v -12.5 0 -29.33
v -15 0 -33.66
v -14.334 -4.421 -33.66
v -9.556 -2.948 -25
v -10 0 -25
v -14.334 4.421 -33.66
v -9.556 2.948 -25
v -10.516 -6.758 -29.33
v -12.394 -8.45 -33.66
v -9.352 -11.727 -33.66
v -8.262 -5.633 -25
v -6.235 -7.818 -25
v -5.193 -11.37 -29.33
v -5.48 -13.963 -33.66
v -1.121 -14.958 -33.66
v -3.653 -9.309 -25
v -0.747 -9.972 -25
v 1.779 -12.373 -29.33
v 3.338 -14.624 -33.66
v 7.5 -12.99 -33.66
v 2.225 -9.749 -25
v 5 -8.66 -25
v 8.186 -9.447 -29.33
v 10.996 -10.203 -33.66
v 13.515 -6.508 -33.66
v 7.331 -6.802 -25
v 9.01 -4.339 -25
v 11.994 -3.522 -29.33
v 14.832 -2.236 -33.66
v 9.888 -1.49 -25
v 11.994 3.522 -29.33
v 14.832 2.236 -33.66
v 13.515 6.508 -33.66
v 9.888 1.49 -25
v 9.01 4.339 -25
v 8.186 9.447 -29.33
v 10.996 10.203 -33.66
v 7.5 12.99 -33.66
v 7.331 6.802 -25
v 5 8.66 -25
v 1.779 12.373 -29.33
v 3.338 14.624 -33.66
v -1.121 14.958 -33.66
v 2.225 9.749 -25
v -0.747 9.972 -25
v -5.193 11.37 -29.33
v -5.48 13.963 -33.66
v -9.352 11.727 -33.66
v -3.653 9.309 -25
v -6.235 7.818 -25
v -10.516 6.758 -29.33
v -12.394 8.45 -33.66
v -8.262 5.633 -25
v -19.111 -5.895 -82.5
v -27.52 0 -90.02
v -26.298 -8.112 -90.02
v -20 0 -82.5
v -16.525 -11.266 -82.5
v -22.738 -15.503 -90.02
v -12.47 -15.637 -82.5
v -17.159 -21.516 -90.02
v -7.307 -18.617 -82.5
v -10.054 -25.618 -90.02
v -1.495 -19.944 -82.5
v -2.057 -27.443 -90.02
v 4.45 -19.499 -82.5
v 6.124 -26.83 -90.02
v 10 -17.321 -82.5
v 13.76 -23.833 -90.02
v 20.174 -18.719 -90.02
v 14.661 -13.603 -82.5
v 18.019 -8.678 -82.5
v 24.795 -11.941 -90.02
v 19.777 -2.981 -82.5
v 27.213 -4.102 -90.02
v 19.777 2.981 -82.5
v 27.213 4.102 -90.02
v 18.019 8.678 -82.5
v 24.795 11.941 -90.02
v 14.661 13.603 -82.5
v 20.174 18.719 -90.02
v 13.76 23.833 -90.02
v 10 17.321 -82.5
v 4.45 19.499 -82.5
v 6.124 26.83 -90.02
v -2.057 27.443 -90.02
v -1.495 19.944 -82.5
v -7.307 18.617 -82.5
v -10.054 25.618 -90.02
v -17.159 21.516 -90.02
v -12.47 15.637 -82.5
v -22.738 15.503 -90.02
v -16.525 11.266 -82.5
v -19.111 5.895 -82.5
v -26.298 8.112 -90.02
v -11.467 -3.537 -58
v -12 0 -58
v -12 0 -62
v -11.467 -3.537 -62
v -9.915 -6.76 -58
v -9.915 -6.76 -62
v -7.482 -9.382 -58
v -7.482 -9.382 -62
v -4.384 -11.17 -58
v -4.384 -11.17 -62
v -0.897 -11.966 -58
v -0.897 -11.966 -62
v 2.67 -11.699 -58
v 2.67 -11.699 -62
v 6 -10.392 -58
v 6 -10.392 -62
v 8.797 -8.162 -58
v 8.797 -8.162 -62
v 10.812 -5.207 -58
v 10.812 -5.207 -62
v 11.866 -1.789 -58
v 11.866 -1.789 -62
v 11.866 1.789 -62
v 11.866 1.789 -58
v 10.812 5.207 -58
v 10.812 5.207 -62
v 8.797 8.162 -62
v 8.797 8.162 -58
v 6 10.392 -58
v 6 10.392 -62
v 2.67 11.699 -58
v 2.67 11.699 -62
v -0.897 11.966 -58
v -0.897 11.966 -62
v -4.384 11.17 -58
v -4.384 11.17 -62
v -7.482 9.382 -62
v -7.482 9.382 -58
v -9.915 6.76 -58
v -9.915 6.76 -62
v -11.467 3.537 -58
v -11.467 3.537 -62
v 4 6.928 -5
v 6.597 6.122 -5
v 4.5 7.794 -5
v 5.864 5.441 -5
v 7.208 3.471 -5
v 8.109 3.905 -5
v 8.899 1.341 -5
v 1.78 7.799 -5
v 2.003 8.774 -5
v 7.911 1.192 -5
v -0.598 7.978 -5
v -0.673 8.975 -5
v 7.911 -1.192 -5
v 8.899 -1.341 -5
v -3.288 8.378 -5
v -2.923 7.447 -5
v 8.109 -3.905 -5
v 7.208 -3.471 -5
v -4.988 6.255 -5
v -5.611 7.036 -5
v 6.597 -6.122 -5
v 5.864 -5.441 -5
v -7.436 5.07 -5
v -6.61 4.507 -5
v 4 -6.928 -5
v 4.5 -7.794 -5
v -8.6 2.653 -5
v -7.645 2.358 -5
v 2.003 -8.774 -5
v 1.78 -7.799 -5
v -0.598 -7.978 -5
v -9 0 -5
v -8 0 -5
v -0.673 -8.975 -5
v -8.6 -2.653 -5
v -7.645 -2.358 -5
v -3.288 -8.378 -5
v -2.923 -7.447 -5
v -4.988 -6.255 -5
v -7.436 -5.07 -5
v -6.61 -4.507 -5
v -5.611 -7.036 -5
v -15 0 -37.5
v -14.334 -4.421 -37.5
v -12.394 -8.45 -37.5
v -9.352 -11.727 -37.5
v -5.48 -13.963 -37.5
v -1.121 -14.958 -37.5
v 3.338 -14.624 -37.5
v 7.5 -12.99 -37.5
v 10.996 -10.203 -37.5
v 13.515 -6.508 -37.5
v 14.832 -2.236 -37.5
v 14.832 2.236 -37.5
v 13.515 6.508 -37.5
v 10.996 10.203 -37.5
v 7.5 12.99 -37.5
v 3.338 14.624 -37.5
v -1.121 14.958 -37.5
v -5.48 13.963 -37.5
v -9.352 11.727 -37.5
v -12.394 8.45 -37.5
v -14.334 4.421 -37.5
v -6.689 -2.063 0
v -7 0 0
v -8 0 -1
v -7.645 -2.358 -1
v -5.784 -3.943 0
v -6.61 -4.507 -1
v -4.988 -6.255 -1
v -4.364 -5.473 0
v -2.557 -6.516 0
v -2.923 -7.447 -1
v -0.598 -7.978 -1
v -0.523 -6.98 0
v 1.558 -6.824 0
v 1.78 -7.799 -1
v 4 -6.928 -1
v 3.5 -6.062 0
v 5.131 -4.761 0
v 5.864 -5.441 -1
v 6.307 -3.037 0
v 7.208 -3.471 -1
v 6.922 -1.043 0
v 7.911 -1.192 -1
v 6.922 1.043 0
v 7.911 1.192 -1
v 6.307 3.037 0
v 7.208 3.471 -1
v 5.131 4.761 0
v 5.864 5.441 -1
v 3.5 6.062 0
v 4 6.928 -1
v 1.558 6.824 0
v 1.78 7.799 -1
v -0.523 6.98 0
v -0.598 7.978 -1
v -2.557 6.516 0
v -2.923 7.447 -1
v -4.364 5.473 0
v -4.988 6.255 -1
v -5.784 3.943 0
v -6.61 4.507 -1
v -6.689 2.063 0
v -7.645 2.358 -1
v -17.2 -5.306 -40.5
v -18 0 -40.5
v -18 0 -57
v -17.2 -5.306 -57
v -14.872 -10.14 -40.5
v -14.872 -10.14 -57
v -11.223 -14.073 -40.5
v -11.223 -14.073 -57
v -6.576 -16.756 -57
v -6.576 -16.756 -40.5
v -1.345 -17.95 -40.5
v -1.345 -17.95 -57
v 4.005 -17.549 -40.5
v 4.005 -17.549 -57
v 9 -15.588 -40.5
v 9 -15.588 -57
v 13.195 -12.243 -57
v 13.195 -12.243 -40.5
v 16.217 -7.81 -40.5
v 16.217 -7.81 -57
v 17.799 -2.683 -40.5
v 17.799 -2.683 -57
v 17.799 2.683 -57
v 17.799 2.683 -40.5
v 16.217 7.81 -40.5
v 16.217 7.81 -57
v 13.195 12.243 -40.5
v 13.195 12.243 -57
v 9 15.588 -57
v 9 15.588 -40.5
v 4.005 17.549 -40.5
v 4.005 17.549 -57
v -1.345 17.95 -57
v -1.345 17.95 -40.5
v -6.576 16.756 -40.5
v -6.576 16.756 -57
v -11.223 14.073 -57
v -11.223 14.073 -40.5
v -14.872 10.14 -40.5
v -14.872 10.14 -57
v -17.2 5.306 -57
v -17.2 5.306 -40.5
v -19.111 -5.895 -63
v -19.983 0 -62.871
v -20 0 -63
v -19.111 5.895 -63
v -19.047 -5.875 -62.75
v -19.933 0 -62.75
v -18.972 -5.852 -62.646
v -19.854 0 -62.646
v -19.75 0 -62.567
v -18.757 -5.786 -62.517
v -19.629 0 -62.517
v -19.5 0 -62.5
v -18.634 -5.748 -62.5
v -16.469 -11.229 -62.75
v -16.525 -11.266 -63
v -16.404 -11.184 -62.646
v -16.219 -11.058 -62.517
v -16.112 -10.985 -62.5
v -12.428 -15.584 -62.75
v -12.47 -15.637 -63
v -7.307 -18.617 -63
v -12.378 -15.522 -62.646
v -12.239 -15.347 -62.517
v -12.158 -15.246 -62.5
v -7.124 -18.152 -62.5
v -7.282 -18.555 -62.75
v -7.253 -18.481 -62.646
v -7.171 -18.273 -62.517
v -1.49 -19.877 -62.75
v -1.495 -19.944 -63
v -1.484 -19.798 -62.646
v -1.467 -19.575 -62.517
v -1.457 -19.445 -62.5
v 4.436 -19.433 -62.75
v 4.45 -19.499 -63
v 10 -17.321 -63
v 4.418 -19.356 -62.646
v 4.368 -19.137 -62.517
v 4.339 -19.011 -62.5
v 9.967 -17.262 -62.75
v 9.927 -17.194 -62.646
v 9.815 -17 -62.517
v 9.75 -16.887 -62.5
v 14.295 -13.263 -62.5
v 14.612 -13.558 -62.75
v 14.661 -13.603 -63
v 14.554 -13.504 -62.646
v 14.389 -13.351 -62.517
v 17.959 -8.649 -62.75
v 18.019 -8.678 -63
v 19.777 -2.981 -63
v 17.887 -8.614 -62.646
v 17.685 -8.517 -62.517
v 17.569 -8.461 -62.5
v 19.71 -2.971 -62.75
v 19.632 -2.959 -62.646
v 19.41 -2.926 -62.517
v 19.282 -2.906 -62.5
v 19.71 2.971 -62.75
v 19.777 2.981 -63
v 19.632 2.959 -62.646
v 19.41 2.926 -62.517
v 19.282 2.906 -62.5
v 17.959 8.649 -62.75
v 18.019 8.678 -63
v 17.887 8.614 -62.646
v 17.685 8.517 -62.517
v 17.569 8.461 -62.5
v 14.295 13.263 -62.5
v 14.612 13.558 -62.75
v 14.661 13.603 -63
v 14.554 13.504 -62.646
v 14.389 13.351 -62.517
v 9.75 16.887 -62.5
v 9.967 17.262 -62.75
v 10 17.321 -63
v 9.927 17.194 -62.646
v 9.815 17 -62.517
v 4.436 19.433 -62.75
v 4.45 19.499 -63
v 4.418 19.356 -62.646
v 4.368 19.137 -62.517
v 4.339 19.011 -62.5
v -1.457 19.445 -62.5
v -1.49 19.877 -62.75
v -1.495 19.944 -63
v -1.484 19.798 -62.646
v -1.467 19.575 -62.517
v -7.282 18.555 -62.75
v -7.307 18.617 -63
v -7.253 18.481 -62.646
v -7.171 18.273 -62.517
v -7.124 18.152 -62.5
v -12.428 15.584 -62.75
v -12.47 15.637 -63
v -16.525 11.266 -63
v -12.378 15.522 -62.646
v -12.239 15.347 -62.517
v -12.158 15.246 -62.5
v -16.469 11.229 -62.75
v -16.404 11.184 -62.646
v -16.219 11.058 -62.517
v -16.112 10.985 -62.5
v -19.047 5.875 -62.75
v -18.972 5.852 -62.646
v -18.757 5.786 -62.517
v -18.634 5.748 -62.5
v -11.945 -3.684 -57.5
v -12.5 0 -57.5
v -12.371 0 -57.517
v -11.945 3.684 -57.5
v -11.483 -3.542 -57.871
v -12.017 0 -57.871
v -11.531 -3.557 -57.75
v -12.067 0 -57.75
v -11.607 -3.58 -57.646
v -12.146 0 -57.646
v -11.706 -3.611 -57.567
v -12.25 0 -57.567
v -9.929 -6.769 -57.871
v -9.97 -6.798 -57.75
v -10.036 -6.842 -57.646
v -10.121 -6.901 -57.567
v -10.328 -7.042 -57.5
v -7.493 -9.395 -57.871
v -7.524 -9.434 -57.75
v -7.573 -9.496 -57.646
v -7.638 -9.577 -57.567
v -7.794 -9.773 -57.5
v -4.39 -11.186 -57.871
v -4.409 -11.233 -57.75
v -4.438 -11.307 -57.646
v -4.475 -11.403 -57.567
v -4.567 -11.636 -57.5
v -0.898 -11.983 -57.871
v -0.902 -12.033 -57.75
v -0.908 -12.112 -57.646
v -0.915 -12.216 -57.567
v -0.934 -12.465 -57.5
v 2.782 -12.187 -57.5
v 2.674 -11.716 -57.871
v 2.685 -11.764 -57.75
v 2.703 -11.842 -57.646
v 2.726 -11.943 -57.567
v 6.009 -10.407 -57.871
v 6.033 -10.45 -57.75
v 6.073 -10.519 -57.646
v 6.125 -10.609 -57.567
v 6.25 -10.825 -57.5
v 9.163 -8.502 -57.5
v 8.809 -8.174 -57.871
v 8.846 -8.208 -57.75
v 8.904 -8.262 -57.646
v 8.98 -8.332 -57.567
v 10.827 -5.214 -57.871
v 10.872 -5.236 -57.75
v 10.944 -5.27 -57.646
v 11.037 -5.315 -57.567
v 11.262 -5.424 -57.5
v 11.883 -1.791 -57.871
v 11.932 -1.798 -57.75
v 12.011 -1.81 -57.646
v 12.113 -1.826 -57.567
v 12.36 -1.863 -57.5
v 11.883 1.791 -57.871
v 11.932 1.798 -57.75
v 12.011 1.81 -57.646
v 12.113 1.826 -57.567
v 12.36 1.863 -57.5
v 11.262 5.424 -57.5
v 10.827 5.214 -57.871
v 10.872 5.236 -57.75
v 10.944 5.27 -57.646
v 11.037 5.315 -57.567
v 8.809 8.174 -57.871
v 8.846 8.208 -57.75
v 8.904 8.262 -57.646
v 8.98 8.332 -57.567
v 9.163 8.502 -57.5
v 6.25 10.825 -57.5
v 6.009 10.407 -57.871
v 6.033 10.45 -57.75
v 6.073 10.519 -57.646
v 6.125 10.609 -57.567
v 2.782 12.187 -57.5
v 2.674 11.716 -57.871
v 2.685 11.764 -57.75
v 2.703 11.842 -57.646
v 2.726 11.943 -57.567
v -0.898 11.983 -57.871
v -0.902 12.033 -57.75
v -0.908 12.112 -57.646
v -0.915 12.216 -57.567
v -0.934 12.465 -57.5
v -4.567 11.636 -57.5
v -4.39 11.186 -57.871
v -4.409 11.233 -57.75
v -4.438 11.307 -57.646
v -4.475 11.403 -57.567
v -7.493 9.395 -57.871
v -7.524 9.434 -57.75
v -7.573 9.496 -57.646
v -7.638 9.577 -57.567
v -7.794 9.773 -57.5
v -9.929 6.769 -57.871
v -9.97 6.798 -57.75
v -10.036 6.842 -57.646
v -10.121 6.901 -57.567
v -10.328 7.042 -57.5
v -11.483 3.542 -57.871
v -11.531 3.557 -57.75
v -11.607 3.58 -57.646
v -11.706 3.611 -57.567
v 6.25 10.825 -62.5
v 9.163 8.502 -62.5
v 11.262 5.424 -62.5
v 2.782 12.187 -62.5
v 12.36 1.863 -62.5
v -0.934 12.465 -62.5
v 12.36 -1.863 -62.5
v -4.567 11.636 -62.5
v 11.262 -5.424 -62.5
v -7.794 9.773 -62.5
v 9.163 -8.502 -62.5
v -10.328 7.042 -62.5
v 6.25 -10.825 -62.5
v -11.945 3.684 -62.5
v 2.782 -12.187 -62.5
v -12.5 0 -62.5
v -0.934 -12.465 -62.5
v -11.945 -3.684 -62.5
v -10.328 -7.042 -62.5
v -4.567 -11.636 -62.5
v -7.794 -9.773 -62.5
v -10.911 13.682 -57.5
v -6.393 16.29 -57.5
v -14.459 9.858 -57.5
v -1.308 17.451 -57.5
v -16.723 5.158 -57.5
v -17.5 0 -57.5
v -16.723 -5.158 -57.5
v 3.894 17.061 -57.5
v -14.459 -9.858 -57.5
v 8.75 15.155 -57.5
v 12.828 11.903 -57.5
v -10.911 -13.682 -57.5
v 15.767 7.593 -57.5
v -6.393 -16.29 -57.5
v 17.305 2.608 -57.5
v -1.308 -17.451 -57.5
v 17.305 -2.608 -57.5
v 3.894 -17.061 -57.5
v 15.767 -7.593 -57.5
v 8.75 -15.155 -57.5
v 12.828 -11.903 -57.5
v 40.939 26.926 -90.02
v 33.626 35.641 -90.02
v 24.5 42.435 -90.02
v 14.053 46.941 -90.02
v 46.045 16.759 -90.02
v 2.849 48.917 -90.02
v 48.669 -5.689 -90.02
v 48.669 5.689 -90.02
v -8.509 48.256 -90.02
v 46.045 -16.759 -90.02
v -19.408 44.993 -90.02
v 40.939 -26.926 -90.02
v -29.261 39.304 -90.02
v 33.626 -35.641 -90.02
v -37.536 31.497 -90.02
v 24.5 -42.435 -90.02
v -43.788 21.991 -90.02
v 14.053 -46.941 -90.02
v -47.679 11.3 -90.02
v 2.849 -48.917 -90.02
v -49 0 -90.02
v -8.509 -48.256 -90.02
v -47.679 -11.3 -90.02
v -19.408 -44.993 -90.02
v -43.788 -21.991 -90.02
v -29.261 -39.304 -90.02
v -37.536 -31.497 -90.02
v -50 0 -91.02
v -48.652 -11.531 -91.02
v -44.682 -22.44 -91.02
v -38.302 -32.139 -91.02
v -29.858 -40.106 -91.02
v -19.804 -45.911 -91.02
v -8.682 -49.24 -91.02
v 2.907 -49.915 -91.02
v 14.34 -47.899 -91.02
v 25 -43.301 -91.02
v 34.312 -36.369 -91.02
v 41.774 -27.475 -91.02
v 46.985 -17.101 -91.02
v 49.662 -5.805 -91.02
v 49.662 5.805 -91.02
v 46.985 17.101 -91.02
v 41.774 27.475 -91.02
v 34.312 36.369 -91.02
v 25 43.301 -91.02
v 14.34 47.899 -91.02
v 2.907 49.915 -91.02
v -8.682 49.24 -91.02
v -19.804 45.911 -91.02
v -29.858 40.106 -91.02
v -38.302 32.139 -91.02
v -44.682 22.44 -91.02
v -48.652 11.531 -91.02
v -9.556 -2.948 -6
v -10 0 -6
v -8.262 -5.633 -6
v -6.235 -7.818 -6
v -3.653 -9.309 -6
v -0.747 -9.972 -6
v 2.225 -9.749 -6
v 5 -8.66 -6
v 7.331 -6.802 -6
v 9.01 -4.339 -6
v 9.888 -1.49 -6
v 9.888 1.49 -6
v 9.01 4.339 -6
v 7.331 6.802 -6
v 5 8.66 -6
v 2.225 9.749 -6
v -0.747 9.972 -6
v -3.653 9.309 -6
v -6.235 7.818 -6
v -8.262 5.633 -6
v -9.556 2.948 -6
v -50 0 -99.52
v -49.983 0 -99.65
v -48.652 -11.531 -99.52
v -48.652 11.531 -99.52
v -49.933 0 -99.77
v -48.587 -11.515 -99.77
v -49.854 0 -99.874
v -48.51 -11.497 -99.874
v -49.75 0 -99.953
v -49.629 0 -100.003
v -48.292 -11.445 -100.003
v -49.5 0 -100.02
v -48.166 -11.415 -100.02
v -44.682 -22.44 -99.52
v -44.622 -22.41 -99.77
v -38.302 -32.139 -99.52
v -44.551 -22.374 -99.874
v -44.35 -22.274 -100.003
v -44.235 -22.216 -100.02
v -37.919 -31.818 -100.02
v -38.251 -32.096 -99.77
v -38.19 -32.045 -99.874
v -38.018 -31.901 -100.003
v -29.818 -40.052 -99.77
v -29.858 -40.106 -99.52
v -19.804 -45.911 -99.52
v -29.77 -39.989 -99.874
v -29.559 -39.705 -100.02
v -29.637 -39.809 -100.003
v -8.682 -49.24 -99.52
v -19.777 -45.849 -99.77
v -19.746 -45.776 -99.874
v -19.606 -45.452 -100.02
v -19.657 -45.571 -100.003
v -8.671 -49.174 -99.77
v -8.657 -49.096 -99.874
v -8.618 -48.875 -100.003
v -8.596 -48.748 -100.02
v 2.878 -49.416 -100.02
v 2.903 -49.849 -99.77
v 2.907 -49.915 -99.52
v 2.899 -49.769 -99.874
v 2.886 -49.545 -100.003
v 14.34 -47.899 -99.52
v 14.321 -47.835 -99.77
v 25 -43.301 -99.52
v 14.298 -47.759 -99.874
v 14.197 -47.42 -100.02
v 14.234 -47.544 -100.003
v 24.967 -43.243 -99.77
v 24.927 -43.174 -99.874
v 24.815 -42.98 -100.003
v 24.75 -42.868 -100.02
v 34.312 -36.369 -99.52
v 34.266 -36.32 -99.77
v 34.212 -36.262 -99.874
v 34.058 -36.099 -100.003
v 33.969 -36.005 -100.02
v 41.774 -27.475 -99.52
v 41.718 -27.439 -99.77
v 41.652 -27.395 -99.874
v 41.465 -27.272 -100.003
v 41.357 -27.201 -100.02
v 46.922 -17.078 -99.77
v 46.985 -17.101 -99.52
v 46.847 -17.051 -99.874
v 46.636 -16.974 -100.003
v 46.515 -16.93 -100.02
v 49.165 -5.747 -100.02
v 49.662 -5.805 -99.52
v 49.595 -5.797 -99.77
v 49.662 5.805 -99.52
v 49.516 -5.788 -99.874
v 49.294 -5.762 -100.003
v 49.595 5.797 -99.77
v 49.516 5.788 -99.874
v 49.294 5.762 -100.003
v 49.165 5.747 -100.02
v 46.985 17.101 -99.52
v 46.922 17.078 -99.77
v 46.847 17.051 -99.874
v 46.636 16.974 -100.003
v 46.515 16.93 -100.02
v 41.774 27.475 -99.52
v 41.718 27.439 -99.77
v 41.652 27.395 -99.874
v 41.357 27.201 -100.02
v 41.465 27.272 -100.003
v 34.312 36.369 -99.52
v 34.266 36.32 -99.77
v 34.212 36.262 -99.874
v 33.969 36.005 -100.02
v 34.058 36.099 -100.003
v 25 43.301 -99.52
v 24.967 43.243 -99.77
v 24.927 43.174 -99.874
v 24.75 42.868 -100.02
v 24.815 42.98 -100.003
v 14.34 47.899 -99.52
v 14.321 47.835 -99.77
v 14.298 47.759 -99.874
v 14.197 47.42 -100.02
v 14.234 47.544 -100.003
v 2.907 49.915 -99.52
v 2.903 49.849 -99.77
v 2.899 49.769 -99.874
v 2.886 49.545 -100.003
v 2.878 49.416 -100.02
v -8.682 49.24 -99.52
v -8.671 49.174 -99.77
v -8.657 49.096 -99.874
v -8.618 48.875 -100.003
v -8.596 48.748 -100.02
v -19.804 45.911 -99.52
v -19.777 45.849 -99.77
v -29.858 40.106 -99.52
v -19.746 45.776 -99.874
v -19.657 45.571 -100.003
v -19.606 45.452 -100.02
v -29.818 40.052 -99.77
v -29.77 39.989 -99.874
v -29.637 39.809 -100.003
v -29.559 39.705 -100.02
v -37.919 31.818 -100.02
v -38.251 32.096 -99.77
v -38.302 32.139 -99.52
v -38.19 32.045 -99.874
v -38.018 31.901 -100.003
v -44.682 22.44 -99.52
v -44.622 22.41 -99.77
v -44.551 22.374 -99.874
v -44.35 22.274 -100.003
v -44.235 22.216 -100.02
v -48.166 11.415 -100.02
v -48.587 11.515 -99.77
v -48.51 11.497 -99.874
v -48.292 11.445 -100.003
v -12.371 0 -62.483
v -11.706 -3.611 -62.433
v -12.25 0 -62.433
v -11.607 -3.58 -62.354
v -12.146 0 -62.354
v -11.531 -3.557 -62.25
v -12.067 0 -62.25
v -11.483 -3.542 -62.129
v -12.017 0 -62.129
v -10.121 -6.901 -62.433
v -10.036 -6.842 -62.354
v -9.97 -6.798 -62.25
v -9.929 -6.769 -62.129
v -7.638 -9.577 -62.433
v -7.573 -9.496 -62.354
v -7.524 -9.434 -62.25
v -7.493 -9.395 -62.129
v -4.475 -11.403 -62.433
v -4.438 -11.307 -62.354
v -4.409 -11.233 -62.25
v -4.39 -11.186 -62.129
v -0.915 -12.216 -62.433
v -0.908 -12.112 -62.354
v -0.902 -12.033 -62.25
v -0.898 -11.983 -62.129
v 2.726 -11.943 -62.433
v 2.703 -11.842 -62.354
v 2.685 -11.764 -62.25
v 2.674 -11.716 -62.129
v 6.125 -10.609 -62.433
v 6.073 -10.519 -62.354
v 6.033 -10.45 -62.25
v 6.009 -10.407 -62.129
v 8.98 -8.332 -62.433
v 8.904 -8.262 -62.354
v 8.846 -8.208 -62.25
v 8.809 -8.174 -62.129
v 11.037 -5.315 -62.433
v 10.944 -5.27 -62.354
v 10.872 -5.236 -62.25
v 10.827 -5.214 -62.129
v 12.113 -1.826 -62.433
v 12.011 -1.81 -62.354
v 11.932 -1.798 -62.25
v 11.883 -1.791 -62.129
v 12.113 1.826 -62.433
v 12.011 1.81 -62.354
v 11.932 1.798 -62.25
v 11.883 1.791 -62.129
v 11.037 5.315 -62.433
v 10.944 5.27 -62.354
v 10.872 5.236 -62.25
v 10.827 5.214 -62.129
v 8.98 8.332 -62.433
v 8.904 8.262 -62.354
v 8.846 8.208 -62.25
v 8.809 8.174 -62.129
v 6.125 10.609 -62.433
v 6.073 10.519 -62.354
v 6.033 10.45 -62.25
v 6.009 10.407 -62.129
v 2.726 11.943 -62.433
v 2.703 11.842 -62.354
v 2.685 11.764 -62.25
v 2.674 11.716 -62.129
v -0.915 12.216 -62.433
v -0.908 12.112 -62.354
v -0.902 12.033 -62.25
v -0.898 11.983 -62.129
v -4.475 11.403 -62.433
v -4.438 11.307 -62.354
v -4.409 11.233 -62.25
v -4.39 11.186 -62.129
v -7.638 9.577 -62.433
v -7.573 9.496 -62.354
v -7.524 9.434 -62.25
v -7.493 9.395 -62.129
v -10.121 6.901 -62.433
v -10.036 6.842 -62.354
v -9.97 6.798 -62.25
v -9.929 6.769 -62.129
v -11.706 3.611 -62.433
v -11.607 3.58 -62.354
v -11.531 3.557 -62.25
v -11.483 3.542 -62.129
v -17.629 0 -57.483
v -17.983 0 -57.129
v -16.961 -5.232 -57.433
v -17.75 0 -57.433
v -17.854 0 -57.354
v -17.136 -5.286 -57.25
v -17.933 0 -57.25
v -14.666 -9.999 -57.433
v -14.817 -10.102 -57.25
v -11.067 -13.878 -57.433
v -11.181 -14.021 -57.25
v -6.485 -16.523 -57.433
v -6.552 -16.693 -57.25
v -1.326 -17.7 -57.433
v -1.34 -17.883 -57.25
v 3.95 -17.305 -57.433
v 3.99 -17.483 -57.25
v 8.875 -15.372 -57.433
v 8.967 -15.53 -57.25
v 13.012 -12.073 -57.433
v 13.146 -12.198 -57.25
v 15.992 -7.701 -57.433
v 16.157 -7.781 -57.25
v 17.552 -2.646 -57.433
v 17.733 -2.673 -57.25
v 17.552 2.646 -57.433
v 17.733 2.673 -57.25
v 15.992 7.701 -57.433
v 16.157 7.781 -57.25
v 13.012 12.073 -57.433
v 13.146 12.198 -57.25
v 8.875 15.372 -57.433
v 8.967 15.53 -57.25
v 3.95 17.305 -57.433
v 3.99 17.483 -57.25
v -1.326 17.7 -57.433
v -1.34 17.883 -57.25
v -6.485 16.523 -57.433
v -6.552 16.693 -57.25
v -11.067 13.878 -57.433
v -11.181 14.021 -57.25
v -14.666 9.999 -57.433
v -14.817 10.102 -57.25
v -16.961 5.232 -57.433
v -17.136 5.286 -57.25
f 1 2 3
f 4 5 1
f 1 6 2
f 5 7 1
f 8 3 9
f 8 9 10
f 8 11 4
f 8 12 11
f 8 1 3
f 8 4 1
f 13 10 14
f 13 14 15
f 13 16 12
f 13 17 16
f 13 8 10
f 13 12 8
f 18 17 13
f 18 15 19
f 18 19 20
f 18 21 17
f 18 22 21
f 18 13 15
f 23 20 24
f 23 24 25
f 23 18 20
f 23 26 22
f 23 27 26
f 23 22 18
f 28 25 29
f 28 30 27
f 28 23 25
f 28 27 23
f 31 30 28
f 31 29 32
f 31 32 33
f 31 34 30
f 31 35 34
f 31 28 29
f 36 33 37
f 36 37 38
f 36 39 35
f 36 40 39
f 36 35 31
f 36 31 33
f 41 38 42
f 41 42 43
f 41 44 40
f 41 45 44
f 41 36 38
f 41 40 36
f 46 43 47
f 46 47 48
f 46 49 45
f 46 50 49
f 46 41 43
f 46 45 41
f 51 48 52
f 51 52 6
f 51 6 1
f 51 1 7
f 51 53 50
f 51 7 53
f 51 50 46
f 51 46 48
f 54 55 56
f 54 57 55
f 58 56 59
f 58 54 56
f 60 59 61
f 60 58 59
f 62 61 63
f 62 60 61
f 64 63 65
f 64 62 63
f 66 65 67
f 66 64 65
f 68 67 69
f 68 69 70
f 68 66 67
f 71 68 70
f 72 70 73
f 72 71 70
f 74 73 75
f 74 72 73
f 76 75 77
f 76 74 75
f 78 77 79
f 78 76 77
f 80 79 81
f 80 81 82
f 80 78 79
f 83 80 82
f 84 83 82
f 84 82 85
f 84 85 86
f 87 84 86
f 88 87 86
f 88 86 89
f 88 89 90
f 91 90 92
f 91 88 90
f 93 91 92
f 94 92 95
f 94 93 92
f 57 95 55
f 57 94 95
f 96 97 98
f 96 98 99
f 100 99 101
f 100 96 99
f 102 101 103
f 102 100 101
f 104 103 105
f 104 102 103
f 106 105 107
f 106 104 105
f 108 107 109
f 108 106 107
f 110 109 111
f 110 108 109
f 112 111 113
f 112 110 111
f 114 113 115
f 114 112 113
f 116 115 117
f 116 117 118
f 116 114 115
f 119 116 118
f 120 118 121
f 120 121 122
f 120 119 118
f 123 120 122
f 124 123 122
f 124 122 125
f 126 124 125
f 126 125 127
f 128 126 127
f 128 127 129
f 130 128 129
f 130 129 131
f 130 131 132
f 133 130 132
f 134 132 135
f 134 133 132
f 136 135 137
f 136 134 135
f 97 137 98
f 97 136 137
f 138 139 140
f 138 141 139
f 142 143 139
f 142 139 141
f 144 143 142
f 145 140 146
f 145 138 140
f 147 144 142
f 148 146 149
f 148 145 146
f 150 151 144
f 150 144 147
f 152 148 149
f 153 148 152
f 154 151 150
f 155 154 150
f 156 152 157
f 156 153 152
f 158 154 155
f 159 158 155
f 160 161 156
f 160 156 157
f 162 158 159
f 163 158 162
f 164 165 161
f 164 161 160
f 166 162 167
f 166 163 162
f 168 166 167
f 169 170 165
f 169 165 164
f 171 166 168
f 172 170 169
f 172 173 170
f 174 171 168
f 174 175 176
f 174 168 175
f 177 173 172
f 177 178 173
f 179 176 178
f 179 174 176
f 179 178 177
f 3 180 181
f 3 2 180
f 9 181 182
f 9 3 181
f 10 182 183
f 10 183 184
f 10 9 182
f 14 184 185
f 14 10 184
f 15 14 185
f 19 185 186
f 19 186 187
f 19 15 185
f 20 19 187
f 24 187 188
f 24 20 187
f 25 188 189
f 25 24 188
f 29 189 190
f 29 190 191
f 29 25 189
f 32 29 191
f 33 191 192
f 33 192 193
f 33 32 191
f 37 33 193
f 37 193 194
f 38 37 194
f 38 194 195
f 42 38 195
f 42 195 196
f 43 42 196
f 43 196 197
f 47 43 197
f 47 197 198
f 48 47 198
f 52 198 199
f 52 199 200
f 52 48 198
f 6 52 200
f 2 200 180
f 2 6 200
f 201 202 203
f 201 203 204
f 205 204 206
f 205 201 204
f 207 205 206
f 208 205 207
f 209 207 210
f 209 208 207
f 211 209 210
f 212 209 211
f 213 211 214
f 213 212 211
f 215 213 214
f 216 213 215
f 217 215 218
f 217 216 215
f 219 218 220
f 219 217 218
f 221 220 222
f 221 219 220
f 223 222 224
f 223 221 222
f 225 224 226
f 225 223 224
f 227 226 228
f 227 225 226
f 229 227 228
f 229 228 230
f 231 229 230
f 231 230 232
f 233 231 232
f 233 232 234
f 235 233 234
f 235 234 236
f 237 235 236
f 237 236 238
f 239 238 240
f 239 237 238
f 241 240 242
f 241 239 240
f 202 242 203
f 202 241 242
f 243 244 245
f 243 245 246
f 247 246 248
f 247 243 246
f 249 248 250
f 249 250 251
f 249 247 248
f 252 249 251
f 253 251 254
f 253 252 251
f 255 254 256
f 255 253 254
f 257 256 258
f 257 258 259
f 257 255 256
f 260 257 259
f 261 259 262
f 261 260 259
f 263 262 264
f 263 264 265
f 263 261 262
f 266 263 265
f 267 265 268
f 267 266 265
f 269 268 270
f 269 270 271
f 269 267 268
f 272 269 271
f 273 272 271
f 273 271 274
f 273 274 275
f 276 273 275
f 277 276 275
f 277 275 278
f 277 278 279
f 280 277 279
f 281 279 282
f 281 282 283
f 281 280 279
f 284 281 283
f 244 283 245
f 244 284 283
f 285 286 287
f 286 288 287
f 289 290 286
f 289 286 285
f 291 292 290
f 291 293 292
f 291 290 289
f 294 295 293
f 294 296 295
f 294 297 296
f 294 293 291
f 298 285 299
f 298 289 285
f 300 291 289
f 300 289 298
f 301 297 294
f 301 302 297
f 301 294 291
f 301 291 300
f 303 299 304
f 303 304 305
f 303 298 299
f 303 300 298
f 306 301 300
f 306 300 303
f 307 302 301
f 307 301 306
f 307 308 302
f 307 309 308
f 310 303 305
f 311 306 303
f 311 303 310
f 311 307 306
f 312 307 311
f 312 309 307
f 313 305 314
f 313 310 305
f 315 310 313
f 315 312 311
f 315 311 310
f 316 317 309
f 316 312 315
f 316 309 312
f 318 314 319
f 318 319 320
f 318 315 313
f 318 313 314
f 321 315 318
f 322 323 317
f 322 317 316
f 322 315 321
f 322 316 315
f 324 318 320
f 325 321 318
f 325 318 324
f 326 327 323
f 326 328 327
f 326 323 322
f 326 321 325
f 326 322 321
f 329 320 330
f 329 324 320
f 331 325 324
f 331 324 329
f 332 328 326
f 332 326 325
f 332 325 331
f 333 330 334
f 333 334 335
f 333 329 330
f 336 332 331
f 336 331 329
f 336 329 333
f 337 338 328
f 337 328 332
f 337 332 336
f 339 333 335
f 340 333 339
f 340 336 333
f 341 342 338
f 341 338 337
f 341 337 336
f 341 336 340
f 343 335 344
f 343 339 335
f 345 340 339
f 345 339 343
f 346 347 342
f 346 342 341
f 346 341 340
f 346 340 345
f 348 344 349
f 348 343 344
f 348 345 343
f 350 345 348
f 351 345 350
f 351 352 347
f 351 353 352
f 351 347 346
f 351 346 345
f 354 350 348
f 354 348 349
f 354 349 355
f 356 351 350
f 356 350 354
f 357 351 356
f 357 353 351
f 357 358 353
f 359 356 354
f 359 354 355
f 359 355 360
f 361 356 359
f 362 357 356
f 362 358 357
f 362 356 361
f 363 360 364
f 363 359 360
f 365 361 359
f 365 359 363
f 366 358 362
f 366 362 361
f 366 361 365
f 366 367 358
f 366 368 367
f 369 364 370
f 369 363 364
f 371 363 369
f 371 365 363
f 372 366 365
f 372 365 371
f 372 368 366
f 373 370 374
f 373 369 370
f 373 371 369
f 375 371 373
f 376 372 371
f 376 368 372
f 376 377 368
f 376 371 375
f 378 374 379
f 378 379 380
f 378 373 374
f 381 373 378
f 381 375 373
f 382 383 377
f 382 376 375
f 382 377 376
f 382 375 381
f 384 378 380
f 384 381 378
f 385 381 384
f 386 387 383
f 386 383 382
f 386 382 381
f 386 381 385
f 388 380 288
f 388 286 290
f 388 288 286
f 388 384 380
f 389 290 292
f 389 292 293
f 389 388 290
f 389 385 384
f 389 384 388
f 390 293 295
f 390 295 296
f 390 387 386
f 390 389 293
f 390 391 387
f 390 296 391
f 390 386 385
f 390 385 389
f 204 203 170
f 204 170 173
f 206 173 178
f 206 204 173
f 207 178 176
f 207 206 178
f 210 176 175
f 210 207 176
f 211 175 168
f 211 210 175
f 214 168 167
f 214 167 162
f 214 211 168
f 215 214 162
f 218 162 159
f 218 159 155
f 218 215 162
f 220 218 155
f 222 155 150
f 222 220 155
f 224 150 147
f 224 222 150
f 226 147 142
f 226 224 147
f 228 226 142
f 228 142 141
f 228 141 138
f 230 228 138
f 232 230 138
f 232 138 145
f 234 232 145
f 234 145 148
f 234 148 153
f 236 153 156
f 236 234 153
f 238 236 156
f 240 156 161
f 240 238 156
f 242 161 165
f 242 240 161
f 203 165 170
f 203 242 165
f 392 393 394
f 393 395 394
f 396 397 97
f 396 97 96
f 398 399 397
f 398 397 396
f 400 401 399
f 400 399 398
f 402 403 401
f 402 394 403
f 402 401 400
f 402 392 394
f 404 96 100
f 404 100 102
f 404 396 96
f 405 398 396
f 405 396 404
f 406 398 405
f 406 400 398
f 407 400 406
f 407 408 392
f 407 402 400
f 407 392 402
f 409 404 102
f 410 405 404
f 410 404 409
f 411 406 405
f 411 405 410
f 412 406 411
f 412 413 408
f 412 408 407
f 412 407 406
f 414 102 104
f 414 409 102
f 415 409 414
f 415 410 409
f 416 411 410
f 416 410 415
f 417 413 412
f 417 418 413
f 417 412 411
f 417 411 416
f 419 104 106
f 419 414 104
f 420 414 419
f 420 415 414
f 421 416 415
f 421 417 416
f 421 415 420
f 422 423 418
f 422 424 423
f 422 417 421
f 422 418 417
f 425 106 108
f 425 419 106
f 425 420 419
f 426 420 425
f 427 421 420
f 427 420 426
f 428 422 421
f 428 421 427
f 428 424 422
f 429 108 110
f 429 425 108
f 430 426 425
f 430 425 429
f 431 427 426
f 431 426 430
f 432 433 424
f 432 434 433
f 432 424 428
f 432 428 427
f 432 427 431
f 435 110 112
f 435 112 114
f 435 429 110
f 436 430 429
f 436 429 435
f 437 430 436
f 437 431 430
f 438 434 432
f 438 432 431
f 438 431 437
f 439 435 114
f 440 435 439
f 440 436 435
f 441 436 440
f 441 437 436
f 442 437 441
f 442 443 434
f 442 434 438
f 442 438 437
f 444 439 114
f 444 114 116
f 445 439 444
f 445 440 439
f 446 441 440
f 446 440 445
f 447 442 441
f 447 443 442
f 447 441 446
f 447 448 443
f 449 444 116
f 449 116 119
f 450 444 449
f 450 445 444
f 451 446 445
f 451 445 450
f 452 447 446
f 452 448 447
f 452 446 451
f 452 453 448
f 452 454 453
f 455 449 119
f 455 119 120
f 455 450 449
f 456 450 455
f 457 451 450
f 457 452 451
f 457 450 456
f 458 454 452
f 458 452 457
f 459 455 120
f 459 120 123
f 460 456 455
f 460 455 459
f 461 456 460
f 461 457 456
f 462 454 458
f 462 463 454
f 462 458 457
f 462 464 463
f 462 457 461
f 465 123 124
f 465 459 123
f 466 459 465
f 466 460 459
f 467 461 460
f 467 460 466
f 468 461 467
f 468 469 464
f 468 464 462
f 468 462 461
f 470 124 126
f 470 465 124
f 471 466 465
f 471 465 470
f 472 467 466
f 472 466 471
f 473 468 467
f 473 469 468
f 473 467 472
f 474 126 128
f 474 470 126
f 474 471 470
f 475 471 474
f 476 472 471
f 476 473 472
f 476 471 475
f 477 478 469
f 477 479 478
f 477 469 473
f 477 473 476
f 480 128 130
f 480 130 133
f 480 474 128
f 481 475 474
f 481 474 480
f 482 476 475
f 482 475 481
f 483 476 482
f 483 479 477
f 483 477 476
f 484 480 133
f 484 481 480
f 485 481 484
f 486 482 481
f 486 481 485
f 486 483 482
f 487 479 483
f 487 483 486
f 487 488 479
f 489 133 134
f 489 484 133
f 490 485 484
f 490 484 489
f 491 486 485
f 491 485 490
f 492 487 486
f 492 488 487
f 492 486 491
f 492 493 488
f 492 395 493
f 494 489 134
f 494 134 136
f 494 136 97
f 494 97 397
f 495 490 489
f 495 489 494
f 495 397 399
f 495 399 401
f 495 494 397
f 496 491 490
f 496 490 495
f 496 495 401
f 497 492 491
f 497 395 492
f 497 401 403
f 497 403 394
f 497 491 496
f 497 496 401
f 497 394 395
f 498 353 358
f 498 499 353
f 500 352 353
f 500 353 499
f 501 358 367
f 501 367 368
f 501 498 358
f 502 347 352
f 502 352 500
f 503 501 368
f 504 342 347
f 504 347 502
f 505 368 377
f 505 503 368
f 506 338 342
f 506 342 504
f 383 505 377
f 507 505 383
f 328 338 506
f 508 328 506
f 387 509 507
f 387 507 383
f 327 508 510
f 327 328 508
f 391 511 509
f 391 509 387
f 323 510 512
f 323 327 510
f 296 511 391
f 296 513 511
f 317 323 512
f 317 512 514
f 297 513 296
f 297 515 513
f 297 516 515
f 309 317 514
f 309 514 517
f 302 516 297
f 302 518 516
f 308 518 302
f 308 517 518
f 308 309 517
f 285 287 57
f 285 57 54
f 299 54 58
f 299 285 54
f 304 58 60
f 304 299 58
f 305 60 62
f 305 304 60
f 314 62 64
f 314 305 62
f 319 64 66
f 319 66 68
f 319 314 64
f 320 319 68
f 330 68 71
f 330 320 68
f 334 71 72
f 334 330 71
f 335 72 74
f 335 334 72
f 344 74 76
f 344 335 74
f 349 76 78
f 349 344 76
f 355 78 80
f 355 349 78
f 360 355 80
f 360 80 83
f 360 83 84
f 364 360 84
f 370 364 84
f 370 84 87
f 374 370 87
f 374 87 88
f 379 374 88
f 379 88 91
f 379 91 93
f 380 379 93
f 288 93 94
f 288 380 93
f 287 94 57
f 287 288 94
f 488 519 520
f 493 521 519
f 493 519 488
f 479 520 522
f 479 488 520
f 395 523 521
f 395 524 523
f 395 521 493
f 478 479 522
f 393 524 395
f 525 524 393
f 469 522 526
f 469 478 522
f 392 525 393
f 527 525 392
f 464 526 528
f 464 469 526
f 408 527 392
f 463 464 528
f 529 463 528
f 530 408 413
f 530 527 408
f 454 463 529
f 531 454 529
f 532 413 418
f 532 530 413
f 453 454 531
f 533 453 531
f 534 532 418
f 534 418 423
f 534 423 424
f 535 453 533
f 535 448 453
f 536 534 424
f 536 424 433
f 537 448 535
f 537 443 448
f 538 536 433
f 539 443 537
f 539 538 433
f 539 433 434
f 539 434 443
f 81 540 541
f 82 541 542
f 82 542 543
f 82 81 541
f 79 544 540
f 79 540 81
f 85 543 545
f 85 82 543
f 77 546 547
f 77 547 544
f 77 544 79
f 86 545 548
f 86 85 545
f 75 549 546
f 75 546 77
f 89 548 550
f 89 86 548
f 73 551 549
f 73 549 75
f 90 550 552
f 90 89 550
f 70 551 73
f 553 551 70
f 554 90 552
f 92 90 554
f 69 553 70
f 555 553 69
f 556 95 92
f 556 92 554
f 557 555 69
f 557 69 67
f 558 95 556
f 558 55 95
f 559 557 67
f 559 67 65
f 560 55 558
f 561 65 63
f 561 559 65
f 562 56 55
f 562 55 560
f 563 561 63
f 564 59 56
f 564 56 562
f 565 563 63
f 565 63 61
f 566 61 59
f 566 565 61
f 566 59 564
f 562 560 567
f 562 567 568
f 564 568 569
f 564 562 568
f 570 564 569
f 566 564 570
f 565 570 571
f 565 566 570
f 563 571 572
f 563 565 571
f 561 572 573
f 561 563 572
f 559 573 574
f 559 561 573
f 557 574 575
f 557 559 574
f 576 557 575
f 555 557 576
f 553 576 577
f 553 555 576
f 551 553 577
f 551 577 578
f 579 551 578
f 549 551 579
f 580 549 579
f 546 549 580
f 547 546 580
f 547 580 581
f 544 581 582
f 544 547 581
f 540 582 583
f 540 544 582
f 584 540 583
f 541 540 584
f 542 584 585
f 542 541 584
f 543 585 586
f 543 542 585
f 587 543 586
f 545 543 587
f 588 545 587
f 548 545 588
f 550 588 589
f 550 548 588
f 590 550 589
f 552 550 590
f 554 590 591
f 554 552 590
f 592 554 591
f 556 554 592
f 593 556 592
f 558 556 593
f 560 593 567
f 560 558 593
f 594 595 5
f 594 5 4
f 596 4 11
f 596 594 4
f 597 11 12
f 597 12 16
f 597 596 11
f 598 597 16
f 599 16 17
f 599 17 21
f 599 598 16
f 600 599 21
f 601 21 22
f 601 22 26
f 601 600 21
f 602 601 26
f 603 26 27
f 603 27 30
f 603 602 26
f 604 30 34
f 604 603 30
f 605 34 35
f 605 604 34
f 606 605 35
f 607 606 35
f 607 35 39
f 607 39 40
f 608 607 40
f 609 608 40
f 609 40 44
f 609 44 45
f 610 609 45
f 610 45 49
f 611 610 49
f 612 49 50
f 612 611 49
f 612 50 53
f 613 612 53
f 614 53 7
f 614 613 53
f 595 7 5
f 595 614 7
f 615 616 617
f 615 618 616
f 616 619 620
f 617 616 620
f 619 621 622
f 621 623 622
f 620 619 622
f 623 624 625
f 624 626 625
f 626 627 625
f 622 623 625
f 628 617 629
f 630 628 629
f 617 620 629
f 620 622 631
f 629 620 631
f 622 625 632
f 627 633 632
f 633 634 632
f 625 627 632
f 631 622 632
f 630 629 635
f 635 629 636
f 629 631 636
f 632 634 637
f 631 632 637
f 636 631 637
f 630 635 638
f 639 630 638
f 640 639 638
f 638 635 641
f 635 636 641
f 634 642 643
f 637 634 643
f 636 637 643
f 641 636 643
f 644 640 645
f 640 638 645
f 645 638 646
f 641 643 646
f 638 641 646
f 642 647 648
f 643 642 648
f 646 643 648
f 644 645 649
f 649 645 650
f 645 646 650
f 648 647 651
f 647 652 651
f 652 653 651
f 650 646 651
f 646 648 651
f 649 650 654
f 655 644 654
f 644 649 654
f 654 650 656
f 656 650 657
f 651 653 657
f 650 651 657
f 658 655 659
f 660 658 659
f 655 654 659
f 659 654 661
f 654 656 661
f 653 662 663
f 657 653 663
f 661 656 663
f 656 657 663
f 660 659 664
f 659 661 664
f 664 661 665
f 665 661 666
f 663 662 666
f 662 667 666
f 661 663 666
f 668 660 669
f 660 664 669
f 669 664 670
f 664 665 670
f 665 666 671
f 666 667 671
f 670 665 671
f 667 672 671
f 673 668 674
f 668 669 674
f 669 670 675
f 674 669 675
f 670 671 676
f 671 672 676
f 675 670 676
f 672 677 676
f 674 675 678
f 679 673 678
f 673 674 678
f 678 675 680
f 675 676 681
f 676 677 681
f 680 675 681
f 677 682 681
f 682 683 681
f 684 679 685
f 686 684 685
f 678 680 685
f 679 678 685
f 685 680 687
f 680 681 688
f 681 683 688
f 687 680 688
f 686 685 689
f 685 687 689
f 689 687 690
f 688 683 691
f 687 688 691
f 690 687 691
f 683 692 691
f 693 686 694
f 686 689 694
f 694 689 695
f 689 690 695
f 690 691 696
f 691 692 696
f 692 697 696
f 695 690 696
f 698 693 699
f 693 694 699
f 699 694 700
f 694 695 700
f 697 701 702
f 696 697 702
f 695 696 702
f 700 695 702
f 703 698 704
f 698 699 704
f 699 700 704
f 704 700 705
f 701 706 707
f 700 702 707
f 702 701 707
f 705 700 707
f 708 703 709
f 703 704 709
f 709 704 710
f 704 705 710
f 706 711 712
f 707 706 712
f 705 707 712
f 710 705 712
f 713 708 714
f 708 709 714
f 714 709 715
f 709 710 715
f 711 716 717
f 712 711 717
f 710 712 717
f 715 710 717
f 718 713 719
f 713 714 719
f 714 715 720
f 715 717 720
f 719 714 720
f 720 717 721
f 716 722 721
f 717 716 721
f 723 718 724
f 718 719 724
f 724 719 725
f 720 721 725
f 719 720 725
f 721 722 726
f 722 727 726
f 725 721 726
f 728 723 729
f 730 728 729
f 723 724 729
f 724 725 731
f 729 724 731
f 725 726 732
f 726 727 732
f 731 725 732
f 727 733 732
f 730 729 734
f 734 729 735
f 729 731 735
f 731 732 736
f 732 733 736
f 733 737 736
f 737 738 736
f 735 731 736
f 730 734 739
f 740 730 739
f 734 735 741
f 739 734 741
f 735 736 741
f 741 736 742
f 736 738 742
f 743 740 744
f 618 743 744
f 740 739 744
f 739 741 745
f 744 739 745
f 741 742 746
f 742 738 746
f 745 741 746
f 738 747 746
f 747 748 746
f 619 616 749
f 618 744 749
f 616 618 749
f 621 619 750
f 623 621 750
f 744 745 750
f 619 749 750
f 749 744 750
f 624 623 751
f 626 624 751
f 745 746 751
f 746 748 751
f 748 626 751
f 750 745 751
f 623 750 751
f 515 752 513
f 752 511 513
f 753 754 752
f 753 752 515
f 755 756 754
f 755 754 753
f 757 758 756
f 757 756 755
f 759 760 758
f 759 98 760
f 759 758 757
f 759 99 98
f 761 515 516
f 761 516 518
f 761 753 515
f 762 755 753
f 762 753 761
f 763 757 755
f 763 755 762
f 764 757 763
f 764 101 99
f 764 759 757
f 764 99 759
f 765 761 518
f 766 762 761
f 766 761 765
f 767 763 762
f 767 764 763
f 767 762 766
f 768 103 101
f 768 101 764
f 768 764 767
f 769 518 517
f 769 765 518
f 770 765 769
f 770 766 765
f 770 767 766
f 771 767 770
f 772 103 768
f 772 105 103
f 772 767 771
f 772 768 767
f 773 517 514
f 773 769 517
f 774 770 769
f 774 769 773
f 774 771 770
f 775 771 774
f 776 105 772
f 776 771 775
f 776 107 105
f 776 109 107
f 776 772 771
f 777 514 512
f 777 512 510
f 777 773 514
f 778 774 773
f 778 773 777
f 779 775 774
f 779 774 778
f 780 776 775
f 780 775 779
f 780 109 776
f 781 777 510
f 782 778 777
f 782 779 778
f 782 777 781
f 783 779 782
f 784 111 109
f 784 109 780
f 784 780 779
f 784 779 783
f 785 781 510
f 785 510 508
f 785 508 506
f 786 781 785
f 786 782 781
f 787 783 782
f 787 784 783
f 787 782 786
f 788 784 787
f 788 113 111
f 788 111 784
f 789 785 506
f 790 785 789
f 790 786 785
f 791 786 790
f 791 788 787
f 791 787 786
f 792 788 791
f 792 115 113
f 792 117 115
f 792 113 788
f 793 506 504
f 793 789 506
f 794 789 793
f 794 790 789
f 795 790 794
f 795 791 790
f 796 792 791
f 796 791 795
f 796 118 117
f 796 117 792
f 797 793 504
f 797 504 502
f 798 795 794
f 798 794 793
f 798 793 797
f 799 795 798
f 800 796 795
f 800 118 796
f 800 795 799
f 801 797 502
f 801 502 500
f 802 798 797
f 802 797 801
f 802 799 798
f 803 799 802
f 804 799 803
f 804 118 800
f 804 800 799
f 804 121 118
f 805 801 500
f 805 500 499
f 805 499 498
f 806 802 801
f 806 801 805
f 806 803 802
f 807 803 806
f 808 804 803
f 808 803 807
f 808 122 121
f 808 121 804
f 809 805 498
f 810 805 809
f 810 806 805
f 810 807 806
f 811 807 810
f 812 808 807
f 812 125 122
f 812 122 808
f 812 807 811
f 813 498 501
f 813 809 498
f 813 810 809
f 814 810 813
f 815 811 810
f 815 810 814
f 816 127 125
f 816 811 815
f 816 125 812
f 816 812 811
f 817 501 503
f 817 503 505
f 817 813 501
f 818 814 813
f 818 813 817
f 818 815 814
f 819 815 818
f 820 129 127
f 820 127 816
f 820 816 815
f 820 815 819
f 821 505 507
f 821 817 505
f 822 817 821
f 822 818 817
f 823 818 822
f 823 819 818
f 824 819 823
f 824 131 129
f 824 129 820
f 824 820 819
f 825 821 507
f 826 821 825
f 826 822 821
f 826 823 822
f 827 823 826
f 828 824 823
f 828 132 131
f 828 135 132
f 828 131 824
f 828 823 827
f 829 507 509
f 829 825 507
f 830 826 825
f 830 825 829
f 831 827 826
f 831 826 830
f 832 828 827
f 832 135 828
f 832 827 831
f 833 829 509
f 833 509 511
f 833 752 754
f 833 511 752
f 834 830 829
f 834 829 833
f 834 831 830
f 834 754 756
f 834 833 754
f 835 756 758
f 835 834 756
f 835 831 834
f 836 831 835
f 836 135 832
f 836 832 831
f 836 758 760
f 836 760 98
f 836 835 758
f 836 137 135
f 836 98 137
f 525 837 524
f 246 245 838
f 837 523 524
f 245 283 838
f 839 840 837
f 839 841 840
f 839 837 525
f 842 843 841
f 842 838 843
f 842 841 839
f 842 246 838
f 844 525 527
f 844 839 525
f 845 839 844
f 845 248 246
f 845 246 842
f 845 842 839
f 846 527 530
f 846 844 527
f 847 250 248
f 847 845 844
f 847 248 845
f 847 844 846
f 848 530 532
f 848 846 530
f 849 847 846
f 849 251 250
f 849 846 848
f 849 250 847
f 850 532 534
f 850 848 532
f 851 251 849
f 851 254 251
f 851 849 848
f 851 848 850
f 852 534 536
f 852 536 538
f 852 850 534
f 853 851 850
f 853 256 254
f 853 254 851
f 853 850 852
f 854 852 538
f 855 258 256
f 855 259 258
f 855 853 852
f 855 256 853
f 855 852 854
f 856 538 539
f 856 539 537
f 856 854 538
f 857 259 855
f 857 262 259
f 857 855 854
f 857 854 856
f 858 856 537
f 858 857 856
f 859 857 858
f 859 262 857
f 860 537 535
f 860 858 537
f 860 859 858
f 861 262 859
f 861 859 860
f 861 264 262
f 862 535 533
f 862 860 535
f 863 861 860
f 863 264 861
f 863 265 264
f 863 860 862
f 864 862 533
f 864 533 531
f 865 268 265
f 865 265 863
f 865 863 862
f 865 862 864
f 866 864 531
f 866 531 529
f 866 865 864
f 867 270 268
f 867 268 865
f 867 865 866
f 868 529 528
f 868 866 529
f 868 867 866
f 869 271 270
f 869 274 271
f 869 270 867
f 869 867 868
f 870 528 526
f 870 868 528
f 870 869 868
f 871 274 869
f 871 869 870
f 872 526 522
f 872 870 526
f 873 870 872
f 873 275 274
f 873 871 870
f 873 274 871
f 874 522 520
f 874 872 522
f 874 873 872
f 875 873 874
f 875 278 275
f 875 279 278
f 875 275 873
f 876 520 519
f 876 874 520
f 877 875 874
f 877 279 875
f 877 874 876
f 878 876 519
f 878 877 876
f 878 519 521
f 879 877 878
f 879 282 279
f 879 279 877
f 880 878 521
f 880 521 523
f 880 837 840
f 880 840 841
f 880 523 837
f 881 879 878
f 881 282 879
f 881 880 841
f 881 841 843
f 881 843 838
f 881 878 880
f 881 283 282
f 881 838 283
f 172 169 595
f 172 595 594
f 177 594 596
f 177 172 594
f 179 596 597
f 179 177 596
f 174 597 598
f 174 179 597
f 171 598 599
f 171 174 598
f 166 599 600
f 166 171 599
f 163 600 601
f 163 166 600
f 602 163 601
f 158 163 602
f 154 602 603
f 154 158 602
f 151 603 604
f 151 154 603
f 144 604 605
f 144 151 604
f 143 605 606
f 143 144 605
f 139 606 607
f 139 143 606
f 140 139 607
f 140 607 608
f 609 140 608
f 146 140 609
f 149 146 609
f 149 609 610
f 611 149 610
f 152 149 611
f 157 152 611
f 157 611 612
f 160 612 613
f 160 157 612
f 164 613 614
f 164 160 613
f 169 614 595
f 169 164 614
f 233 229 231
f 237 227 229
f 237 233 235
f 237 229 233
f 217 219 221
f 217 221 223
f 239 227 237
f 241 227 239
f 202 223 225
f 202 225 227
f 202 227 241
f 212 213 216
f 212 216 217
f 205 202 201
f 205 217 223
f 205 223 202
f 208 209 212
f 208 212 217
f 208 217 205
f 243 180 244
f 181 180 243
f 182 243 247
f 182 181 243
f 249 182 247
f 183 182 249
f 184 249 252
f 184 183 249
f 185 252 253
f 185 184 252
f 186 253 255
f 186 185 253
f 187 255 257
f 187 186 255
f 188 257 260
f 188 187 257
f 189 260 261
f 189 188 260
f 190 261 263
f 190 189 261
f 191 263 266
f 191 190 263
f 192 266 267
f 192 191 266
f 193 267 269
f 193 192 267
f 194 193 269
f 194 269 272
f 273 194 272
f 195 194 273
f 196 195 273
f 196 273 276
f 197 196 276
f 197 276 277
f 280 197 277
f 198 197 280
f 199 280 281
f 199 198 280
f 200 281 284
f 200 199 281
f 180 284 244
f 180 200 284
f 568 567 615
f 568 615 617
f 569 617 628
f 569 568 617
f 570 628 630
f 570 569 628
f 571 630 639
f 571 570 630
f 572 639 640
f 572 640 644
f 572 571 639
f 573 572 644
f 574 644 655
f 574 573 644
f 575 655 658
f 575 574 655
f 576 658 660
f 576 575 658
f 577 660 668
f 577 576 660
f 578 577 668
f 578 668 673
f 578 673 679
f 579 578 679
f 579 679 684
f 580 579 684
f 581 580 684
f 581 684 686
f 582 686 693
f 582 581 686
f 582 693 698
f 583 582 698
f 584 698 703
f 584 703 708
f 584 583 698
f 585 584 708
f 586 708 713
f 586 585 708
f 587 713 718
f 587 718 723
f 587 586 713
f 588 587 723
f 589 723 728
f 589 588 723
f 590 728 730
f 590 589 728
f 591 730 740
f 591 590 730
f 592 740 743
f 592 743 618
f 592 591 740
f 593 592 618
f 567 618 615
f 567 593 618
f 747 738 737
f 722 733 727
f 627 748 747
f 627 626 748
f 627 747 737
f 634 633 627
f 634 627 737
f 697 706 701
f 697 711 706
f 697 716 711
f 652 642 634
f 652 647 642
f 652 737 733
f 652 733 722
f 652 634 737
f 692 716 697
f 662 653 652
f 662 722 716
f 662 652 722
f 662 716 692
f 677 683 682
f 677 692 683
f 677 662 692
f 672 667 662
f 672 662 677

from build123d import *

# Parameters (mm, degrees)
CHAMFER1_SIZE = 1
FILLET1_R     = 0.5


with BuildPart() as part:
    # Sketch5 → Revolve1 (revolve)
    with BuildSketch(Plane(origin=(0, 0, 0), x_dir=(1, 0, 0), z_dir=(0, 1, 0)), mode=Mode.PRIVATE) as revolve1_sk:
        Polygon((0, 100.020445287), (50, 100.020445287), (49.999997016, 90.020445287), (27.520445287, 90.020445287), (20, 82.5), (20, 62.5), (12, 62.5), (12, 57.5), (18, 57.5), (18, 40.5), (15, 37.5), (15, 33.660254038), (10, 25), (10, 5), (8, 5), (8, 0), (0, 0), align=None)
    revolve(revolve1_sk.sketch.rotate(Axis((0, 0, -100.020445287), (0, 0, 1)), 180), axis=Axis((0, 0, -100.020445287), (0, 0, 1)))

    # Chamfer1
    chamfer1_edges = [part.edges().sort_by_distance(p)[0] for p in [
        (8, 0, 0),
        (10, 0, -5),
        (49.999997016, 0, -90.020445287),
    ]]
    chamfer(chamfer1_edges, length=CHAMFER1_SIZE)

    # Fillet1
    fillet1_edges = [part.edges().sort_by_distance(p)[0] for p in [
        (18, 0, -57.5),
        (12, 0, -57.5),
        (12, 0, -62.5),
        (20, 0, -62.5),
        (50, 0, -100.020445287),
    ]]
    fillet(fillet1_edges, radius=FILLET1_R)


solid = part.part
